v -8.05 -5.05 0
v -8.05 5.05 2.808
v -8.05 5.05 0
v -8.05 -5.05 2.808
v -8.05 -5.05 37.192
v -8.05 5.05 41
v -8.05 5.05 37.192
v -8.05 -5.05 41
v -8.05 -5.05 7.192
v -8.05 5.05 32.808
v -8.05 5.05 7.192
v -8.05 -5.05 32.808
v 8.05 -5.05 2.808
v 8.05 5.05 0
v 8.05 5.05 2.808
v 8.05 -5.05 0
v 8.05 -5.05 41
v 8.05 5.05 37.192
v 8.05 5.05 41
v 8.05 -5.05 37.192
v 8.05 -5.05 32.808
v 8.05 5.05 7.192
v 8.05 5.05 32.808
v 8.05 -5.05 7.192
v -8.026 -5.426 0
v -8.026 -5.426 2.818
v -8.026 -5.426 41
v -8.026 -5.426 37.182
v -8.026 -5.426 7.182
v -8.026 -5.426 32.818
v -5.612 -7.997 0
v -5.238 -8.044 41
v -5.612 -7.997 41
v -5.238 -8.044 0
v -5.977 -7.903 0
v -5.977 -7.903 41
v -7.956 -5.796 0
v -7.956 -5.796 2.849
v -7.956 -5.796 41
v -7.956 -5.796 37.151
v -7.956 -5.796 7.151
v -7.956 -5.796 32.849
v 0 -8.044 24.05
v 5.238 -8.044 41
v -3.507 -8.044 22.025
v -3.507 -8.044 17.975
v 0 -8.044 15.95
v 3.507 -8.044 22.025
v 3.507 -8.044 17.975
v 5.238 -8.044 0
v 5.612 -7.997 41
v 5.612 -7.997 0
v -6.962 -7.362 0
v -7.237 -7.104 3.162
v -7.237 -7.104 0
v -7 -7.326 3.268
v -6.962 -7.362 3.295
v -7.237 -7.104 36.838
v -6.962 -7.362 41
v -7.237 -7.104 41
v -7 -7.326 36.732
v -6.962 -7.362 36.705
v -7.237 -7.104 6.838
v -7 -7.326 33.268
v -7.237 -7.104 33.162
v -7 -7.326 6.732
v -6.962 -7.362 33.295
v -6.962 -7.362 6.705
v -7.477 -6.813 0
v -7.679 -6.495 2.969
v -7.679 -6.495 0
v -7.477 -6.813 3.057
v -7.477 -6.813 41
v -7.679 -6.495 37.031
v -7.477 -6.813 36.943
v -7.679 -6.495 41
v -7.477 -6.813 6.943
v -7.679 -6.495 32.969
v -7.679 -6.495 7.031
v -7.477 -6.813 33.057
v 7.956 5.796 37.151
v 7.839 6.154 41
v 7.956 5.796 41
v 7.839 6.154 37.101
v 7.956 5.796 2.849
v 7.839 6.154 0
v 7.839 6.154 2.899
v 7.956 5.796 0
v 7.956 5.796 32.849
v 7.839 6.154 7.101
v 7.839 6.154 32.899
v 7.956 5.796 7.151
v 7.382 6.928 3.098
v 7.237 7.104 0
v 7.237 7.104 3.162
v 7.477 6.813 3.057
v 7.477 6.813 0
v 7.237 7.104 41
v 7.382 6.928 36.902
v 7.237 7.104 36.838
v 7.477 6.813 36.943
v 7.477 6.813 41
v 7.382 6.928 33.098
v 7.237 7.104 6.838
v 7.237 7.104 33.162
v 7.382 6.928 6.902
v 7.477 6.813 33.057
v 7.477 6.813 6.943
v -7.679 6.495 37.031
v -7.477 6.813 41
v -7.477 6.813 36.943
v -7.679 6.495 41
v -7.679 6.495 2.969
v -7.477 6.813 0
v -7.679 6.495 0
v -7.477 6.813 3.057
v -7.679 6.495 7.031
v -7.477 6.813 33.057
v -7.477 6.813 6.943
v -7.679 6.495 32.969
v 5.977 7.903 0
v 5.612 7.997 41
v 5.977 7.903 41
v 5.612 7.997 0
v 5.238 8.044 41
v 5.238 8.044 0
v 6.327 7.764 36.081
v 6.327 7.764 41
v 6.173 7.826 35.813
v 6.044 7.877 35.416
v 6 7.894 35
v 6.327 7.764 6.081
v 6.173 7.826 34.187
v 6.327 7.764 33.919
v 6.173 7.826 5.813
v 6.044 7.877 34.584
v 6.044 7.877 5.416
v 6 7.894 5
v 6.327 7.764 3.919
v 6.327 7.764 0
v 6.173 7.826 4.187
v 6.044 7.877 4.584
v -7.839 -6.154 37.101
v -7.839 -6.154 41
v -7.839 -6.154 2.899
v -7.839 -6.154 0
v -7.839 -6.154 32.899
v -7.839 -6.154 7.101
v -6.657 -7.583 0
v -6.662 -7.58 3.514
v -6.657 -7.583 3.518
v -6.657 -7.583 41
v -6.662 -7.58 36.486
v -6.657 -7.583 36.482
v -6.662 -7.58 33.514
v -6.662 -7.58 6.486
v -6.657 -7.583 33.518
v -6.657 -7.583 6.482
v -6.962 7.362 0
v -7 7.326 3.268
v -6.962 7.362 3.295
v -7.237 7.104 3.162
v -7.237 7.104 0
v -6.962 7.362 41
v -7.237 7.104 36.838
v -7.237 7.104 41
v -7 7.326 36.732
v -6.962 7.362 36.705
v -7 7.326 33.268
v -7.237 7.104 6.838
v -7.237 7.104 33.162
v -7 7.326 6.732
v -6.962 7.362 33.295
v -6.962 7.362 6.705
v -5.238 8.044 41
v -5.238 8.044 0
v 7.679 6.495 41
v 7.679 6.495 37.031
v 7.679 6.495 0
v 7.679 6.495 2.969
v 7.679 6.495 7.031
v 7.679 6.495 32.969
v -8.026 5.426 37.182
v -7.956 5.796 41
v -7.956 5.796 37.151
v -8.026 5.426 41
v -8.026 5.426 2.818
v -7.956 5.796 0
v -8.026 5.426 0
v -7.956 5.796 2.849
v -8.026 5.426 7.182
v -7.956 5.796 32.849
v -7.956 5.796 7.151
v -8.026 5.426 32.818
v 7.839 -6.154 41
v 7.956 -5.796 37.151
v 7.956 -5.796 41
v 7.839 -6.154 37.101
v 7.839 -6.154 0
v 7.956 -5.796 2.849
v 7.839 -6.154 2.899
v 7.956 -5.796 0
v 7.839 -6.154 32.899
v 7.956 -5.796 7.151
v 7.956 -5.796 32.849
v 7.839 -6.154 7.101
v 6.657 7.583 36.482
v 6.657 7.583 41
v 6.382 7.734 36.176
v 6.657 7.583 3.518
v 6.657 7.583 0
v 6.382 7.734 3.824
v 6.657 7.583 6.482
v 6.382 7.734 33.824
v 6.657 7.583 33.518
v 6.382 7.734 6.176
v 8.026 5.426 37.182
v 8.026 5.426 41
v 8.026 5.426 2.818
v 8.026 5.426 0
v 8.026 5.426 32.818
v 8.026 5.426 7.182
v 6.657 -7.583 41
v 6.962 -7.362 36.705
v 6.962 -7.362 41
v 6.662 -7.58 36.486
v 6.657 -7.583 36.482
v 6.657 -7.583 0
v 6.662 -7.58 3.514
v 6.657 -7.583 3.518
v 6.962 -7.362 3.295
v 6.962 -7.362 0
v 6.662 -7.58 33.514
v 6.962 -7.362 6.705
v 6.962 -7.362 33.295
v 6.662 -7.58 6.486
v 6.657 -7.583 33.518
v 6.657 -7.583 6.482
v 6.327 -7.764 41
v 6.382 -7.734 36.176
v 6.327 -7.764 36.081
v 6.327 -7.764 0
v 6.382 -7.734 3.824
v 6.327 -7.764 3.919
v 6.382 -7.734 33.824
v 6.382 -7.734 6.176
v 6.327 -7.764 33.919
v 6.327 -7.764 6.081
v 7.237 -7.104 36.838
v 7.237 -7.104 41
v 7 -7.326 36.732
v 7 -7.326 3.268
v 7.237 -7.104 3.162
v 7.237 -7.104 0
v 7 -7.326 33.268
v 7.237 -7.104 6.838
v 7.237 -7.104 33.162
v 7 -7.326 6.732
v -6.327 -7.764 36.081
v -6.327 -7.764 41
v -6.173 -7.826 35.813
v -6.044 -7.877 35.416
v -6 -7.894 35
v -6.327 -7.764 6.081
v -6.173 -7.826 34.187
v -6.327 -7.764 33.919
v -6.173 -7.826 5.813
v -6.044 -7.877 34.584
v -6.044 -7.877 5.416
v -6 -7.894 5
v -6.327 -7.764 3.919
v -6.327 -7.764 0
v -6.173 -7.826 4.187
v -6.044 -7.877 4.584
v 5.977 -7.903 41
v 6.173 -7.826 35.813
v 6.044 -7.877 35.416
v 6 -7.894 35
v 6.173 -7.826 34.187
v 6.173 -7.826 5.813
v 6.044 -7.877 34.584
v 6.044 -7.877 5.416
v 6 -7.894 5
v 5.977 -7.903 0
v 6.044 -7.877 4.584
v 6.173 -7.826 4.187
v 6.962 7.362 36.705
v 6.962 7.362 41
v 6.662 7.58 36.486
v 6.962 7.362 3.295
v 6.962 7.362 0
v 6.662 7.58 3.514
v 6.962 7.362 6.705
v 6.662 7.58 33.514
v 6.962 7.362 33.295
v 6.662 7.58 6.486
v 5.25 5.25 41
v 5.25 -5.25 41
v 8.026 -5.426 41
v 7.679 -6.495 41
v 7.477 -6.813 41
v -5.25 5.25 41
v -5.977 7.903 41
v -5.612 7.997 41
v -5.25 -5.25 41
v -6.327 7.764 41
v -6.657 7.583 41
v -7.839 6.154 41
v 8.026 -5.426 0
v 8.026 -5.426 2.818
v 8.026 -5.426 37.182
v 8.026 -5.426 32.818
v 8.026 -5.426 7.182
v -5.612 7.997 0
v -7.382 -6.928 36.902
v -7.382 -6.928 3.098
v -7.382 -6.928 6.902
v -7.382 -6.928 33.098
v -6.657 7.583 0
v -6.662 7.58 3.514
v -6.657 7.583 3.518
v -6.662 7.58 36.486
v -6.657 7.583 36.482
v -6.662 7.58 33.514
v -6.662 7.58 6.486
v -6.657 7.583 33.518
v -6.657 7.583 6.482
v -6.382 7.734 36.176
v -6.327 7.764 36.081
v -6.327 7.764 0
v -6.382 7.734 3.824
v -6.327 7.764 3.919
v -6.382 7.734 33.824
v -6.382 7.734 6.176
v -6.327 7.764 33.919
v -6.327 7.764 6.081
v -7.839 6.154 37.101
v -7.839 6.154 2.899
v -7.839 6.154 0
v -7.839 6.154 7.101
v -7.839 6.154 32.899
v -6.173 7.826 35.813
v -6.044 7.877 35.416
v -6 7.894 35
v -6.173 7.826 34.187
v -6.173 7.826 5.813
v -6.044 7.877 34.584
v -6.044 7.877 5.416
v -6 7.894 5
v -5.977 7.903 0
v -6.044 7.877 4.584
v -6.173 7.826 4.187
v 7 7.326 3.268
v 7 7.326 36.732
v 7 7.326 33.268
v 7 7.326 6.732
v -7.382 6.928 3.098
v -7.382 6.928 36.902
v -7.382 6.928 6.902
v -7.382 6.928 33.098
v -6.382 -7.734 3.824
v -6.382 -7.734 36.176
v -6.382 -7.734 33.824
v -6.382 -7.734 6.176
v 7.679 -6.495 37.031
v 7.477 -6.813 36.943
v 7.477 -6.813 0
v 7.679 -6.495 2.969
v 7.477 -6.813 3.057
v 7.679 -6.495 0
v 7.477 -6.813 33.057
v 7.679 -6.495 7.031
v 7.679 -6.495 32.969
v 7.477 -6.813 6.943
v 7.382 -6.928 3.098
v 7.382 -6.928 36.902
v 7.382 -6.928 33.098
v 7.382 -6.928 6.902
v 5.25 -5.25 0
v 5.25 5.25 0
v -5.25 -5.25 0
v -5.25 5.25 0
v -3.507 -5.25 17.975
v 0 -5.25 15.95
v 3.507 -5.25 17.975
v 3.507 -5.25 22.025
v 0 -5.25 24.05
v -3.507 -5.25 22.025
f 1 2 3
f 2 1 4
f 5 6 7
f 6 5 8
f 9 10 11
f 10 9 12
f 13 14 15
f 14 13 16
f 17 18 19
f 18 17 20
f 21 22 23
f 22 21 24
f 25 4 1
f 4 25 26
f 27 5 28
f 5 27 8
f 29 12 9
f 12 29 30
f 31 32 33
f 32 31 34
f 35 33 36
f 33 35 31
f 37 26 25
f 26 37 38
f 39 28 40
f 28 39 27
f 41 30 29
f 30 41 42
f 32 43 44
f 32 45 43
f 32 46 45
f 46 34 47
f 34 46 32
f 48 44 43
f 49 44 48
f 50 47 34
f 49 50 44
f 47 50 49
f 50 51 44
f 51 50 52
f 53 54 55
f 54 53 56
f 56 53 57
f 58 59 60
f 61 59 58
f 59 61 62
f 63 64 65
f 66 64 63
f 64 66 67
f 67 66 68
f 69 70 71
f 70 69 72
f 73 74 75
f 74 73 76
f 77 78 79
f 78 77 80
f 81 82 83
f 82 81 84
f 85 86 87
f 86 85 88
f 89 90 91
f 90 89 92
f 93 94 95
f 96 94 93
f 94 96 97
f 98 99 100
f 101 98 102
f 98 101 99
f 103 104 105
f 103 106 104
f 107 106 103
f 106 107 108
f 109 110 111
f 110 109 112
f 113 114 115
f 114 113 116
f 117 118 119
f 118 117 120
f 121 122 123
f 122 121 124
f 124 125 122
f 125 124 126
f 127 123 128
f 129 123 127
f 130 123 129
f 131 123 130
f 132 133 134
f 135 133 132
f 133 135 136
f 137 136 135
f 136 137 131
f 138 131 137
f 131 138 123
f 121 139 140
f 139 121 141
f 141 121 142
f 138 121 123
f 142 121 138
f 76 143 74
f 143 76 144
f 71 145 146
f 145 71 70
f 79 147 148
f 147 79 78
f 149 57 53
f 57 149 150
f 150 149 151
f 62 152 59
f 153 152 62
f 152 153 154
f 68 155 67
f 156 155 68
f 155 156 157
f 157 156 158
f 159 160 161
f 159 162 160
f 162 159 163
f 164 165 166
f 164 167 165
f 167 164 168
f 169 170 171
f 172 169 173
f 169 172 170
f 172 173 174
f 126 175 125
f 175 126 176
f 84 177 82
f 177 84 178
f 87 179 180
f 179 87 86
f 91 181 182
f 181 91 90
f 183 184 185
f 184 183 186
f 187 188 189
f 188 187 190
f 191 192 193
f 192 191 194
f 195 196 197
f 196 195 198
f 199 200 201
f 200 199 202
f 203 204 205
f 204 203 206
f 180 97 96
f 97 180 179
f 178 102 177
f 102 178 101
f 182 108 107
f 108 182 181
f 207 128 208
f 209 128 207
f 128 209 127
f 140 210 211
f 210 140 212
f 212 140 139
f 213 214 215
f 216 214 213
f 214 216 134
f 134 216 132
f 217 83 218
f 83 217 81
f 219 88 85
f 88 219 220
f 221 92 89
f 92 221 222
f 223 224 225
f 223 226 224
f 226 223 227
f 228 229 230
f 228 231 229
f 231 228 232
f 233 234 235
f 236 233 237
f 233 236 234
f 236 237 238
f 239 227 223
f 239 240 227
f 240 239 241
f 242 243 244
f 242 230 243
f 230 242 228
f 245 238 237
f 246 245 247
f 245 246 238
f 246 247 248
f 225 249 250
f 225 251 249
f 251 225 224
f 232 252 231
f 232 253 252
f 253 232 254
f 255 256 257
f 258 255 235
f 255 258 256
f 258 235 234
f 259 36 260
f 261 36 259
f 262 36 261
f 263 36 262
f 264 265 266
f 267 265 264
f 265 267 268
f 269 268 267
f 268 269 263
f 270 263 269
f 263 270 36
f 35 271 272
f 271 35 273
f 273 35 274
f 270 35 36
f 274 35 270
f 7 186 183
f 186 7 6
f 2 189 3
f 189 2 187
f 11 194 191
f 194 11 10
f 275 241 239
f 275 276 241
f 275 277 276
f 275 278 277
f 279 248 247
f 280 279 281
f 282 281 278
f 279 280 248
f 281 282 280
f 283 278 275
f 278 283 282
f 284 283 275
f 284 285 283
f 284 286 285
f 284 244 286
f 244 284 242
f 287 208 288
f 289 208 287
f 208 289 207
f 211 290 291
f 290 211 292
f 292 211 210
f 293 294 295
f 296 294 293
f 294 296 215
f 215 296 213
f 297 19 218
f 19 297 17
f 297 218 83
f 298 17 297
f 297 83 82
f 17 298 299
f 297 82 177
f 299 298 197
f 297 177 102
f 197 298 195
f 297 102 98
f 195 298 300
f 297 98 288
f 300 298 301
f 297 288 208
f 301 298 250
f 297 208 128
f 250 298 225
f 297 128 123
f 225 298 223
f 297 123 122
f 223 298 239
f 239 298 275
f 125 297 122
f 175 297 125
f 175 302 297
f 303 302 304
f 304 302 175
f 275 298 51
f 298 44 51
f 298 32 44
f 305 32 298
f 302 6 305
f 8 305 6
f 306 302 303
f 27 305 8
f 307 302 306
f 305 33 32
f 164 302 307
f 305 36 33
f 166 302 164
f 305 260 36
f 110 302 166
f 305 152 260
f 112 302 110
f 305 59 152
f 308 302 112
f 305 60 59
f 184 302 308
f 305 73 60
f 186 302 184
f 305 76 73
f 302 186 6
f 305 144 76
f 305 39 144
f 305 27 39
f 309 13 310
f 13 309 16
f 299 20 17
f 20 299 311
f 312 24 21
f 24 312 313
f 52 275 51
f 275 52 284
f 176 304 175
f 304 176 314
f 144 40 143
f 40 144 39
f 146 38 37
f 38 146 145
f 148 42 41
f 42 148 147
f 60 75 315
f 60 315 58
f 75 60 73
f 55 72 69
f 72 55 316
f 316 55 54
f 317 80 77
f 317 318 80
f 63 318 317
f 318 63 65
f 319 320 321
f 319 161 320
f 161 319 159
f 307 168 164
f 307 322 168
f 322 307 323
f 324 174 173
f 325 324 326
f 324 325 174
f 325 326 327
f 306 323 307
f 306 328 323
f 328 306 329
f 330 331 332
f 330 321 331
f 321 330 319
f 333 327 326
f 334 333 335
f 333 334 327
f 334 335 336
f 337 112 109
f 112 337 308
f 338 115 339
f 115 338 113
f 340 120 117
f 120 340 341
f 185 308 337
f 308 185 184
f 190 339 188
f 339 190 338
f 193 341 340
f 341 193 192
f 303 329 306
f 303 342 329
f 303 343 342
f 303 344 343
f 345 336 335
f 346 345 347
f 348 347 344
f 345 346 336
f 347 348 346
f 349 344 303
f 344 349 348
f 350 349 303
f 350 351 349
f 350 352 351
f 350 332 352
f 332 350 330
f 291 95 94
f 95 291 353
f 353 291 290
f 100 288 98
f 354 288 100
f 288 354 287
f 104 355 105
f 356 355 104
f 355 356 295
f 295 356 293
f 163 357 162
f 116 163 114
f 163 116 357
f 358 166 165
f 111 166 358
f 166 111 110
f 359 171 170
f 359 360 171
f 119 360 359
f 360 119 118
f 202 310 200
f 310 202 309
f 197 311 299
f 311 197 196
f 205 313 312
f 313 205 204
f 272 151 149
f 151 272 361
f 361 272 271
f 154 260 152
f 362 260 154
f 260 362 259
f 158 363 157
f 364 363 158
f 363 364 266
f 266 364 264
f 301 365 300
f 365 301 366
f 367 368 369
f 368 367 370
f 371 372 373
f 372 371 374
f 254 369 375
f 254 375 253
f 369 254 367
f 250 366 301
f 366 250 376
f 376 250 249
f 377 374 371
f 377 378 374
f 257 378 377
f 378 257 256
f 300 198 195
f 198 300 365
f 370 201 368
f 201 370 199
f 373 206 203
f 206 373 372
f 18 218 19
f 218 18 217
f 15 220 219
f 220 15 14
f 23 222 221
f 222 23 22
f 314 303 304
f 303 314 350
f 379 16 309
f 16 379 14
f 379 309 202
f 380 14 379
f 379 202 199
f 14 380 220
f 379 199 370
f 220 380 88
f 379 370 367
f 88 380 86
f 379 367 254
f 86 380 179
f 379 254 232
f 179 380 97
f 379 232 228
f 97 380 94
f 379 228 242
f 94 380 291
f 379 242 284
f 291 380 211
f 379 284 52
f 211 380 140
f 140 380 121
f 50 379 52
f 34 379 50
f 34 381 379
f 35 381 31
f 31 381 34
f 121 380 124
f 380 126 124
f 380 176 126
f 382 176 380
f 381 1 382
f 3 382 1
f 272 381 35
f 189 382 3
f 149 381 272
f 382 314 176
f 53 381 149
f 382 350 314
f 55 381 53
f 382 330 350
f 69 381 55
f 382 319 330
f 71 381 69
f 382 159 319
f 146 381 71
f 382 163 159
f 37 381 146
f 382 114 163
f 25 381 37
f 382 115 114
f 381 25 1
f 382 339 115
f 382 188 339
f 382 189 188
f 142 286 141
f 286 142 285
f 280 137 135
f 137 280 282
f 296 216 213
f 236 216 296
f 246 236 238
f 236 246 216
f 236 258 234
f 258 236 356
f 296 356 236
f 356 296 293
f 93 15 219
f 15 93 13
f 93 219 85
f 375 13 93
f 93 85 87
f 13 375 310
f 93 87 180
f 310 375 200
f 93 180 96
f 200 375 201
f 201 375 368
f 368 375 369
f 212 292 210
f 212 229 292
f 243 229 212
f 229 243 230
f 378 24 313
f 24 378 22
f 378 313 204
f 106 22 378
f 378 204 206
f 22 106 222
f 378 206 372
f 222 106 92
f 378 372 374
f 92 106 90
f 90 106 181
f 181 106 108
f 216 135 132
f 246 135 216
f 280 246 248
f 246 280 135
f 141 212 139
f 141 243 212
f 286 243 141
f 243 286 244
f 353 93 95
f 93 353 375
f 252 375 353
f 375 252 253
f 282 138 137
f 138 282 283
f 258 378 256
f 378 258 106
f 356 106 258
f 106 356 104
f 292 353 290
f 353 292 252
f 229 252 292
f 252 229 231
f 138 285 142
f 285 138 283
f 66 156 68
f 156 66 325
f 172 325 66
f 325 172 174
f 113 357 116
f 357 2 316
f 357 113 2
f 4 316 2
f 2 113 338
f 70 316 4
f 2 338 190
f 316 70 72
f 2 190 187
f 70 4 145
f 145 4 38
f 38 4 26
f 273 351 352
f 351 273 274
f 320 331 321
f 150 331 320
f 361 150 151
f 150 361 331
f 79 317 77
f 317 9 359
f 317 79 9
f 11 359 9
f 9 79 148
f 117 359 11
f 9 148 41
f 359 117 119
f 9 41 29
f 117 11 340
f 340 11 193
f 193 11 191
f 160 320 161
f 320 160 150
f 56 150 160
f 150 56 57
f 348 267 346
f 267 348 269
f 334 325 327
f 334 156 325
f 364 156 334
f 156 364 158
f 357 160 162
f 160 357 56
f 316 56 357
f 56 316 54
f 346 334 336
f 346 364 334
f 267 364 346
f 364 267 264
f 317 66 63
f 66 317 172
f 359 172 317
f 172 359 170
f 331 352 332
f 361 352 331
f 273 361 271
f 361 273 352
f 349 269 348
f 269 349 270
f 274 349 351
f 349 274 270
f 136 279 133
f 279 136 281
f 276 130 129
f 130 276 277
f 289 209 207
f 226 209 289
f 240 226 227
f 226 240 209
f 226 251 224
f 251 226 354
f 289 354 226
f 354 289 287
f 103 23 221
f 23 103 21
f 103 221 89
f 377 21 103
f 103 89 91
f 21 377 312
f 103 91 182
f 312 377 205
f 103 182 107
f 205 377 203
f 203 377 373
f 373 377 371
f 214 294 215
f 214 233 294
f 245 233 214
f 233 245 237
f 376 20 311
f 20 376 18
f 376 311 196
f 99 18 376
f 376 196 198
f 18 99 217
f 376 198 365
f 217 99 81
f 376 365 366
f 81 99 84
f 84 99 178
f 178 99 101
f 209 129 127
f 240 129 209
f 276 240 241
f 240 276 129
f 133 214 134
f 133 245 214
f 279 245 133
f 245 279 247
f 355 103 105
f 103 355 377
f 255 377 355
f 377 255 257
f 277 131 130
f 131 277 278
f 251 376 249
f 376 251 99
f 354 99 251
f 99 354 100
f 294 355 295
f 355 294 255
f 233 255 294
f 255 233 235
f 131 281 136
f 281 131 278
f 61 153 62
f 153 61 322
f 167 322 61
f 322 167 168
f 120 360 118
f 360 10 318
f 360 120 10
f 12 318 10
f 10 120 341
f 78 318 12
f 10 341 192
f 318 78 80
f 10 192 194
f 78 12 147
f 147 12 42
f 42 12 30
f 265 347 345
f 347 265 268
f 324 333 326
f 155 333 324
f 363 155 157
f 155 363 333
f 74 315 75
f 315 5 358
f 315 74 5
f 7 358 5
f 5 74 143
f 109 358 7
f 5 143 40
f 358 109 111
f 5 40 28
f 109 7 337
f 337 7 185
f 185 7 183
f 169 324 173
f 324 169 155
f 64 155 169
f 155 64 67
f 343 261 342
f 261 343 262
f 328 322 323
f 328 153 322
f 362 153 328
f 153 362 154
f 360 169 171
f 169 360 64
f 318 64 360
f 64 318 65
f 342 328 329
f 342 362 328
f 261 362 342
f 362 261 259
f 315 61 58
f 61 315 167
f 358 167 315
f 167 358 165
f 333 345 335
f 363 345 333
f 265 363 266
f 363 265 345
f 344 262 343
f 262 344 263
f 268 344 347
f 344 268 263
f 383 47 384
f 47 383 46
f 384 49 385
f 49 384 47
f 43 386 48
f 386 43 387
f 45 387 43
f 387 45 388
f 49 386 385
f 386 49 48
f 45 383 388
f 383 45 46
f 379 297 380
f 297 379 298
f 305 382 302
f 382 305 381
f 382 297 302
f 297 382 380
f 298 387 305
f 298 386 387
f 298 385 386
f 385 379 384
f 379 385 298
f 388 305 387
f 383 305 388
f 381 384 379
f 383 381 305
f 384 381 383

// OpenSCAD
// file: tube.scad
$fn = 50;


module tube(height, width, fillet, hole){
	if(hole>0){
		difference(){
			translate([fillet-width/2,fillet-width/2,0]){
				minkowski(){
					cube([width-fillet*2,width-fillet*2,height]);
					cylinder(r=fillet,h=1);
				}
			}
			translate([width/2,width/2,-.5])
			cylinder(h=height+2,r=hole); 
		}
	} else {
	translate([fillet-width/2,fillet-width/2,0]){
		minkowski(){
			cube([width-fillet*2,width-fillet*2,height]);
			cylinder(r=fillet,h=1);
		}
	}
}
}



tube(20,20,3,0);
// file: Configuration.scad
in = 25.4;
tubeInWidth = 10.5;
tubeWall = 2.8;
tubeOutWidth = tubeInWidth+2*tubeWall;

boltHead = 8.5; 
boltR = 2;

filletRad = 5;

module fillet(){
	difference(){
		translate([0,0,-.5]) cube([filletRad+2,filletRad+2,height+1]);
		translate([0,0,-1])cylinder(r=filletRad, h=height+2, $fn=60);
	}
}

	plugWidth = 15.8;
	plugHeight = 8.8;
	plugDepth = 20.2;
	wall = 1.5;
	hole = 1.5;
// main file
include <Configuration.scad>;
use <tube.scad>;

module tail(){
	
	length = 40;
	
	boltHousingRadius = 4;
	boltHousingTube = tubeOutWidth;
	boltHousingScale = 1.3;
	housingDistance = 4;
	
	boltVirtOffset	= 15;
	boltOffsetWidth	= 8;
	boltOffsetLength = tubeOutWidth/2;
	boltScale = 2;
	boltDistance = 5;

	difference(){
		union(){
			tube(length,tubeOutWidth,3,0); // outer

			intersection(){
				tube(length+4,boltHousingTube,4,0); // Bolt Cutter
				union(){
					translate([boltOffsetWidth,boltOffsetLength,length/2-boltVirtOffset]) rotate([90,0,0]) bolt(boltHousingRadius,tubeOutWidth-1,boltHousingScale,housingDistance);
					translate([-1*boltOffsetWidth,boltOffsetLength,length/2-boltVirtOffset]) rotate([90,180,0]) bolt(boltHousingRadius,tubeOutWidth-1,boltHousingScale,housingDistance);
					translate([boltOffsetWidth,boltOffsetLength,length/2+boltVirtOffset]) rotate([90,0,0]) bolt(boltHousingRadius,tubeOutWidth-1,boltHousingScale,housingDistance);
					translate([-1*boltOffsetWidth,boltOffsetLength,length/2+boltVirtOffset]) rotate([90,180,0]) bolt(boltHousingRadius,tubeOutWidth-1,boltHousingScale,housingDistance);
				}
			}
		}
		translate([boltOffsetWidth,boltOffsetLength+.5,length/2-boltVirtOffset]) rotate([90,0,0]) bolt(boltR,tubeOutWidth,boltScale,boltDistance);
		translate([-1*boltOffsetWidth,boltOffsetLength+.5,length/2-boltVirtOffset]) rotate([90,180,0]) bolt(boltR,tubeOutWidth,boltScale,boltDistance);
		translate([boltOffsetWidth,boltOffsetLength+.5,length/2+boltVirtOffset]) rotate([90,0,0]) bolt(boltR,tubeOutWidth,boltScale,boltDistance);
		translate([-1*boltOffsetWidth,boltOffsetLength+.5,length/2+boltVirtOffset]) rotate([90,180,0]) bolt(boltR,tubeOutWidth,boltScale,boltDistance);
		translate([0,0,length/2]) rotate([90,30,0]) cylinder(r=boltHead/2-.2, h=tubeOutWidth, $fn=6);

		translate([0,0,length/2+.5])cube([tubeInWidth,tubeInWidth,length+4], center=true); // inner tube
	}
}

module bolt(radius,height,scale,distance){
	hull(){
		cylinder(r=radius,h=height+1,$fn=30);
		translate([distance,0,0])cylinder(r=radius*scale,h=height+1,$fn=30);
	}
}

tail();
